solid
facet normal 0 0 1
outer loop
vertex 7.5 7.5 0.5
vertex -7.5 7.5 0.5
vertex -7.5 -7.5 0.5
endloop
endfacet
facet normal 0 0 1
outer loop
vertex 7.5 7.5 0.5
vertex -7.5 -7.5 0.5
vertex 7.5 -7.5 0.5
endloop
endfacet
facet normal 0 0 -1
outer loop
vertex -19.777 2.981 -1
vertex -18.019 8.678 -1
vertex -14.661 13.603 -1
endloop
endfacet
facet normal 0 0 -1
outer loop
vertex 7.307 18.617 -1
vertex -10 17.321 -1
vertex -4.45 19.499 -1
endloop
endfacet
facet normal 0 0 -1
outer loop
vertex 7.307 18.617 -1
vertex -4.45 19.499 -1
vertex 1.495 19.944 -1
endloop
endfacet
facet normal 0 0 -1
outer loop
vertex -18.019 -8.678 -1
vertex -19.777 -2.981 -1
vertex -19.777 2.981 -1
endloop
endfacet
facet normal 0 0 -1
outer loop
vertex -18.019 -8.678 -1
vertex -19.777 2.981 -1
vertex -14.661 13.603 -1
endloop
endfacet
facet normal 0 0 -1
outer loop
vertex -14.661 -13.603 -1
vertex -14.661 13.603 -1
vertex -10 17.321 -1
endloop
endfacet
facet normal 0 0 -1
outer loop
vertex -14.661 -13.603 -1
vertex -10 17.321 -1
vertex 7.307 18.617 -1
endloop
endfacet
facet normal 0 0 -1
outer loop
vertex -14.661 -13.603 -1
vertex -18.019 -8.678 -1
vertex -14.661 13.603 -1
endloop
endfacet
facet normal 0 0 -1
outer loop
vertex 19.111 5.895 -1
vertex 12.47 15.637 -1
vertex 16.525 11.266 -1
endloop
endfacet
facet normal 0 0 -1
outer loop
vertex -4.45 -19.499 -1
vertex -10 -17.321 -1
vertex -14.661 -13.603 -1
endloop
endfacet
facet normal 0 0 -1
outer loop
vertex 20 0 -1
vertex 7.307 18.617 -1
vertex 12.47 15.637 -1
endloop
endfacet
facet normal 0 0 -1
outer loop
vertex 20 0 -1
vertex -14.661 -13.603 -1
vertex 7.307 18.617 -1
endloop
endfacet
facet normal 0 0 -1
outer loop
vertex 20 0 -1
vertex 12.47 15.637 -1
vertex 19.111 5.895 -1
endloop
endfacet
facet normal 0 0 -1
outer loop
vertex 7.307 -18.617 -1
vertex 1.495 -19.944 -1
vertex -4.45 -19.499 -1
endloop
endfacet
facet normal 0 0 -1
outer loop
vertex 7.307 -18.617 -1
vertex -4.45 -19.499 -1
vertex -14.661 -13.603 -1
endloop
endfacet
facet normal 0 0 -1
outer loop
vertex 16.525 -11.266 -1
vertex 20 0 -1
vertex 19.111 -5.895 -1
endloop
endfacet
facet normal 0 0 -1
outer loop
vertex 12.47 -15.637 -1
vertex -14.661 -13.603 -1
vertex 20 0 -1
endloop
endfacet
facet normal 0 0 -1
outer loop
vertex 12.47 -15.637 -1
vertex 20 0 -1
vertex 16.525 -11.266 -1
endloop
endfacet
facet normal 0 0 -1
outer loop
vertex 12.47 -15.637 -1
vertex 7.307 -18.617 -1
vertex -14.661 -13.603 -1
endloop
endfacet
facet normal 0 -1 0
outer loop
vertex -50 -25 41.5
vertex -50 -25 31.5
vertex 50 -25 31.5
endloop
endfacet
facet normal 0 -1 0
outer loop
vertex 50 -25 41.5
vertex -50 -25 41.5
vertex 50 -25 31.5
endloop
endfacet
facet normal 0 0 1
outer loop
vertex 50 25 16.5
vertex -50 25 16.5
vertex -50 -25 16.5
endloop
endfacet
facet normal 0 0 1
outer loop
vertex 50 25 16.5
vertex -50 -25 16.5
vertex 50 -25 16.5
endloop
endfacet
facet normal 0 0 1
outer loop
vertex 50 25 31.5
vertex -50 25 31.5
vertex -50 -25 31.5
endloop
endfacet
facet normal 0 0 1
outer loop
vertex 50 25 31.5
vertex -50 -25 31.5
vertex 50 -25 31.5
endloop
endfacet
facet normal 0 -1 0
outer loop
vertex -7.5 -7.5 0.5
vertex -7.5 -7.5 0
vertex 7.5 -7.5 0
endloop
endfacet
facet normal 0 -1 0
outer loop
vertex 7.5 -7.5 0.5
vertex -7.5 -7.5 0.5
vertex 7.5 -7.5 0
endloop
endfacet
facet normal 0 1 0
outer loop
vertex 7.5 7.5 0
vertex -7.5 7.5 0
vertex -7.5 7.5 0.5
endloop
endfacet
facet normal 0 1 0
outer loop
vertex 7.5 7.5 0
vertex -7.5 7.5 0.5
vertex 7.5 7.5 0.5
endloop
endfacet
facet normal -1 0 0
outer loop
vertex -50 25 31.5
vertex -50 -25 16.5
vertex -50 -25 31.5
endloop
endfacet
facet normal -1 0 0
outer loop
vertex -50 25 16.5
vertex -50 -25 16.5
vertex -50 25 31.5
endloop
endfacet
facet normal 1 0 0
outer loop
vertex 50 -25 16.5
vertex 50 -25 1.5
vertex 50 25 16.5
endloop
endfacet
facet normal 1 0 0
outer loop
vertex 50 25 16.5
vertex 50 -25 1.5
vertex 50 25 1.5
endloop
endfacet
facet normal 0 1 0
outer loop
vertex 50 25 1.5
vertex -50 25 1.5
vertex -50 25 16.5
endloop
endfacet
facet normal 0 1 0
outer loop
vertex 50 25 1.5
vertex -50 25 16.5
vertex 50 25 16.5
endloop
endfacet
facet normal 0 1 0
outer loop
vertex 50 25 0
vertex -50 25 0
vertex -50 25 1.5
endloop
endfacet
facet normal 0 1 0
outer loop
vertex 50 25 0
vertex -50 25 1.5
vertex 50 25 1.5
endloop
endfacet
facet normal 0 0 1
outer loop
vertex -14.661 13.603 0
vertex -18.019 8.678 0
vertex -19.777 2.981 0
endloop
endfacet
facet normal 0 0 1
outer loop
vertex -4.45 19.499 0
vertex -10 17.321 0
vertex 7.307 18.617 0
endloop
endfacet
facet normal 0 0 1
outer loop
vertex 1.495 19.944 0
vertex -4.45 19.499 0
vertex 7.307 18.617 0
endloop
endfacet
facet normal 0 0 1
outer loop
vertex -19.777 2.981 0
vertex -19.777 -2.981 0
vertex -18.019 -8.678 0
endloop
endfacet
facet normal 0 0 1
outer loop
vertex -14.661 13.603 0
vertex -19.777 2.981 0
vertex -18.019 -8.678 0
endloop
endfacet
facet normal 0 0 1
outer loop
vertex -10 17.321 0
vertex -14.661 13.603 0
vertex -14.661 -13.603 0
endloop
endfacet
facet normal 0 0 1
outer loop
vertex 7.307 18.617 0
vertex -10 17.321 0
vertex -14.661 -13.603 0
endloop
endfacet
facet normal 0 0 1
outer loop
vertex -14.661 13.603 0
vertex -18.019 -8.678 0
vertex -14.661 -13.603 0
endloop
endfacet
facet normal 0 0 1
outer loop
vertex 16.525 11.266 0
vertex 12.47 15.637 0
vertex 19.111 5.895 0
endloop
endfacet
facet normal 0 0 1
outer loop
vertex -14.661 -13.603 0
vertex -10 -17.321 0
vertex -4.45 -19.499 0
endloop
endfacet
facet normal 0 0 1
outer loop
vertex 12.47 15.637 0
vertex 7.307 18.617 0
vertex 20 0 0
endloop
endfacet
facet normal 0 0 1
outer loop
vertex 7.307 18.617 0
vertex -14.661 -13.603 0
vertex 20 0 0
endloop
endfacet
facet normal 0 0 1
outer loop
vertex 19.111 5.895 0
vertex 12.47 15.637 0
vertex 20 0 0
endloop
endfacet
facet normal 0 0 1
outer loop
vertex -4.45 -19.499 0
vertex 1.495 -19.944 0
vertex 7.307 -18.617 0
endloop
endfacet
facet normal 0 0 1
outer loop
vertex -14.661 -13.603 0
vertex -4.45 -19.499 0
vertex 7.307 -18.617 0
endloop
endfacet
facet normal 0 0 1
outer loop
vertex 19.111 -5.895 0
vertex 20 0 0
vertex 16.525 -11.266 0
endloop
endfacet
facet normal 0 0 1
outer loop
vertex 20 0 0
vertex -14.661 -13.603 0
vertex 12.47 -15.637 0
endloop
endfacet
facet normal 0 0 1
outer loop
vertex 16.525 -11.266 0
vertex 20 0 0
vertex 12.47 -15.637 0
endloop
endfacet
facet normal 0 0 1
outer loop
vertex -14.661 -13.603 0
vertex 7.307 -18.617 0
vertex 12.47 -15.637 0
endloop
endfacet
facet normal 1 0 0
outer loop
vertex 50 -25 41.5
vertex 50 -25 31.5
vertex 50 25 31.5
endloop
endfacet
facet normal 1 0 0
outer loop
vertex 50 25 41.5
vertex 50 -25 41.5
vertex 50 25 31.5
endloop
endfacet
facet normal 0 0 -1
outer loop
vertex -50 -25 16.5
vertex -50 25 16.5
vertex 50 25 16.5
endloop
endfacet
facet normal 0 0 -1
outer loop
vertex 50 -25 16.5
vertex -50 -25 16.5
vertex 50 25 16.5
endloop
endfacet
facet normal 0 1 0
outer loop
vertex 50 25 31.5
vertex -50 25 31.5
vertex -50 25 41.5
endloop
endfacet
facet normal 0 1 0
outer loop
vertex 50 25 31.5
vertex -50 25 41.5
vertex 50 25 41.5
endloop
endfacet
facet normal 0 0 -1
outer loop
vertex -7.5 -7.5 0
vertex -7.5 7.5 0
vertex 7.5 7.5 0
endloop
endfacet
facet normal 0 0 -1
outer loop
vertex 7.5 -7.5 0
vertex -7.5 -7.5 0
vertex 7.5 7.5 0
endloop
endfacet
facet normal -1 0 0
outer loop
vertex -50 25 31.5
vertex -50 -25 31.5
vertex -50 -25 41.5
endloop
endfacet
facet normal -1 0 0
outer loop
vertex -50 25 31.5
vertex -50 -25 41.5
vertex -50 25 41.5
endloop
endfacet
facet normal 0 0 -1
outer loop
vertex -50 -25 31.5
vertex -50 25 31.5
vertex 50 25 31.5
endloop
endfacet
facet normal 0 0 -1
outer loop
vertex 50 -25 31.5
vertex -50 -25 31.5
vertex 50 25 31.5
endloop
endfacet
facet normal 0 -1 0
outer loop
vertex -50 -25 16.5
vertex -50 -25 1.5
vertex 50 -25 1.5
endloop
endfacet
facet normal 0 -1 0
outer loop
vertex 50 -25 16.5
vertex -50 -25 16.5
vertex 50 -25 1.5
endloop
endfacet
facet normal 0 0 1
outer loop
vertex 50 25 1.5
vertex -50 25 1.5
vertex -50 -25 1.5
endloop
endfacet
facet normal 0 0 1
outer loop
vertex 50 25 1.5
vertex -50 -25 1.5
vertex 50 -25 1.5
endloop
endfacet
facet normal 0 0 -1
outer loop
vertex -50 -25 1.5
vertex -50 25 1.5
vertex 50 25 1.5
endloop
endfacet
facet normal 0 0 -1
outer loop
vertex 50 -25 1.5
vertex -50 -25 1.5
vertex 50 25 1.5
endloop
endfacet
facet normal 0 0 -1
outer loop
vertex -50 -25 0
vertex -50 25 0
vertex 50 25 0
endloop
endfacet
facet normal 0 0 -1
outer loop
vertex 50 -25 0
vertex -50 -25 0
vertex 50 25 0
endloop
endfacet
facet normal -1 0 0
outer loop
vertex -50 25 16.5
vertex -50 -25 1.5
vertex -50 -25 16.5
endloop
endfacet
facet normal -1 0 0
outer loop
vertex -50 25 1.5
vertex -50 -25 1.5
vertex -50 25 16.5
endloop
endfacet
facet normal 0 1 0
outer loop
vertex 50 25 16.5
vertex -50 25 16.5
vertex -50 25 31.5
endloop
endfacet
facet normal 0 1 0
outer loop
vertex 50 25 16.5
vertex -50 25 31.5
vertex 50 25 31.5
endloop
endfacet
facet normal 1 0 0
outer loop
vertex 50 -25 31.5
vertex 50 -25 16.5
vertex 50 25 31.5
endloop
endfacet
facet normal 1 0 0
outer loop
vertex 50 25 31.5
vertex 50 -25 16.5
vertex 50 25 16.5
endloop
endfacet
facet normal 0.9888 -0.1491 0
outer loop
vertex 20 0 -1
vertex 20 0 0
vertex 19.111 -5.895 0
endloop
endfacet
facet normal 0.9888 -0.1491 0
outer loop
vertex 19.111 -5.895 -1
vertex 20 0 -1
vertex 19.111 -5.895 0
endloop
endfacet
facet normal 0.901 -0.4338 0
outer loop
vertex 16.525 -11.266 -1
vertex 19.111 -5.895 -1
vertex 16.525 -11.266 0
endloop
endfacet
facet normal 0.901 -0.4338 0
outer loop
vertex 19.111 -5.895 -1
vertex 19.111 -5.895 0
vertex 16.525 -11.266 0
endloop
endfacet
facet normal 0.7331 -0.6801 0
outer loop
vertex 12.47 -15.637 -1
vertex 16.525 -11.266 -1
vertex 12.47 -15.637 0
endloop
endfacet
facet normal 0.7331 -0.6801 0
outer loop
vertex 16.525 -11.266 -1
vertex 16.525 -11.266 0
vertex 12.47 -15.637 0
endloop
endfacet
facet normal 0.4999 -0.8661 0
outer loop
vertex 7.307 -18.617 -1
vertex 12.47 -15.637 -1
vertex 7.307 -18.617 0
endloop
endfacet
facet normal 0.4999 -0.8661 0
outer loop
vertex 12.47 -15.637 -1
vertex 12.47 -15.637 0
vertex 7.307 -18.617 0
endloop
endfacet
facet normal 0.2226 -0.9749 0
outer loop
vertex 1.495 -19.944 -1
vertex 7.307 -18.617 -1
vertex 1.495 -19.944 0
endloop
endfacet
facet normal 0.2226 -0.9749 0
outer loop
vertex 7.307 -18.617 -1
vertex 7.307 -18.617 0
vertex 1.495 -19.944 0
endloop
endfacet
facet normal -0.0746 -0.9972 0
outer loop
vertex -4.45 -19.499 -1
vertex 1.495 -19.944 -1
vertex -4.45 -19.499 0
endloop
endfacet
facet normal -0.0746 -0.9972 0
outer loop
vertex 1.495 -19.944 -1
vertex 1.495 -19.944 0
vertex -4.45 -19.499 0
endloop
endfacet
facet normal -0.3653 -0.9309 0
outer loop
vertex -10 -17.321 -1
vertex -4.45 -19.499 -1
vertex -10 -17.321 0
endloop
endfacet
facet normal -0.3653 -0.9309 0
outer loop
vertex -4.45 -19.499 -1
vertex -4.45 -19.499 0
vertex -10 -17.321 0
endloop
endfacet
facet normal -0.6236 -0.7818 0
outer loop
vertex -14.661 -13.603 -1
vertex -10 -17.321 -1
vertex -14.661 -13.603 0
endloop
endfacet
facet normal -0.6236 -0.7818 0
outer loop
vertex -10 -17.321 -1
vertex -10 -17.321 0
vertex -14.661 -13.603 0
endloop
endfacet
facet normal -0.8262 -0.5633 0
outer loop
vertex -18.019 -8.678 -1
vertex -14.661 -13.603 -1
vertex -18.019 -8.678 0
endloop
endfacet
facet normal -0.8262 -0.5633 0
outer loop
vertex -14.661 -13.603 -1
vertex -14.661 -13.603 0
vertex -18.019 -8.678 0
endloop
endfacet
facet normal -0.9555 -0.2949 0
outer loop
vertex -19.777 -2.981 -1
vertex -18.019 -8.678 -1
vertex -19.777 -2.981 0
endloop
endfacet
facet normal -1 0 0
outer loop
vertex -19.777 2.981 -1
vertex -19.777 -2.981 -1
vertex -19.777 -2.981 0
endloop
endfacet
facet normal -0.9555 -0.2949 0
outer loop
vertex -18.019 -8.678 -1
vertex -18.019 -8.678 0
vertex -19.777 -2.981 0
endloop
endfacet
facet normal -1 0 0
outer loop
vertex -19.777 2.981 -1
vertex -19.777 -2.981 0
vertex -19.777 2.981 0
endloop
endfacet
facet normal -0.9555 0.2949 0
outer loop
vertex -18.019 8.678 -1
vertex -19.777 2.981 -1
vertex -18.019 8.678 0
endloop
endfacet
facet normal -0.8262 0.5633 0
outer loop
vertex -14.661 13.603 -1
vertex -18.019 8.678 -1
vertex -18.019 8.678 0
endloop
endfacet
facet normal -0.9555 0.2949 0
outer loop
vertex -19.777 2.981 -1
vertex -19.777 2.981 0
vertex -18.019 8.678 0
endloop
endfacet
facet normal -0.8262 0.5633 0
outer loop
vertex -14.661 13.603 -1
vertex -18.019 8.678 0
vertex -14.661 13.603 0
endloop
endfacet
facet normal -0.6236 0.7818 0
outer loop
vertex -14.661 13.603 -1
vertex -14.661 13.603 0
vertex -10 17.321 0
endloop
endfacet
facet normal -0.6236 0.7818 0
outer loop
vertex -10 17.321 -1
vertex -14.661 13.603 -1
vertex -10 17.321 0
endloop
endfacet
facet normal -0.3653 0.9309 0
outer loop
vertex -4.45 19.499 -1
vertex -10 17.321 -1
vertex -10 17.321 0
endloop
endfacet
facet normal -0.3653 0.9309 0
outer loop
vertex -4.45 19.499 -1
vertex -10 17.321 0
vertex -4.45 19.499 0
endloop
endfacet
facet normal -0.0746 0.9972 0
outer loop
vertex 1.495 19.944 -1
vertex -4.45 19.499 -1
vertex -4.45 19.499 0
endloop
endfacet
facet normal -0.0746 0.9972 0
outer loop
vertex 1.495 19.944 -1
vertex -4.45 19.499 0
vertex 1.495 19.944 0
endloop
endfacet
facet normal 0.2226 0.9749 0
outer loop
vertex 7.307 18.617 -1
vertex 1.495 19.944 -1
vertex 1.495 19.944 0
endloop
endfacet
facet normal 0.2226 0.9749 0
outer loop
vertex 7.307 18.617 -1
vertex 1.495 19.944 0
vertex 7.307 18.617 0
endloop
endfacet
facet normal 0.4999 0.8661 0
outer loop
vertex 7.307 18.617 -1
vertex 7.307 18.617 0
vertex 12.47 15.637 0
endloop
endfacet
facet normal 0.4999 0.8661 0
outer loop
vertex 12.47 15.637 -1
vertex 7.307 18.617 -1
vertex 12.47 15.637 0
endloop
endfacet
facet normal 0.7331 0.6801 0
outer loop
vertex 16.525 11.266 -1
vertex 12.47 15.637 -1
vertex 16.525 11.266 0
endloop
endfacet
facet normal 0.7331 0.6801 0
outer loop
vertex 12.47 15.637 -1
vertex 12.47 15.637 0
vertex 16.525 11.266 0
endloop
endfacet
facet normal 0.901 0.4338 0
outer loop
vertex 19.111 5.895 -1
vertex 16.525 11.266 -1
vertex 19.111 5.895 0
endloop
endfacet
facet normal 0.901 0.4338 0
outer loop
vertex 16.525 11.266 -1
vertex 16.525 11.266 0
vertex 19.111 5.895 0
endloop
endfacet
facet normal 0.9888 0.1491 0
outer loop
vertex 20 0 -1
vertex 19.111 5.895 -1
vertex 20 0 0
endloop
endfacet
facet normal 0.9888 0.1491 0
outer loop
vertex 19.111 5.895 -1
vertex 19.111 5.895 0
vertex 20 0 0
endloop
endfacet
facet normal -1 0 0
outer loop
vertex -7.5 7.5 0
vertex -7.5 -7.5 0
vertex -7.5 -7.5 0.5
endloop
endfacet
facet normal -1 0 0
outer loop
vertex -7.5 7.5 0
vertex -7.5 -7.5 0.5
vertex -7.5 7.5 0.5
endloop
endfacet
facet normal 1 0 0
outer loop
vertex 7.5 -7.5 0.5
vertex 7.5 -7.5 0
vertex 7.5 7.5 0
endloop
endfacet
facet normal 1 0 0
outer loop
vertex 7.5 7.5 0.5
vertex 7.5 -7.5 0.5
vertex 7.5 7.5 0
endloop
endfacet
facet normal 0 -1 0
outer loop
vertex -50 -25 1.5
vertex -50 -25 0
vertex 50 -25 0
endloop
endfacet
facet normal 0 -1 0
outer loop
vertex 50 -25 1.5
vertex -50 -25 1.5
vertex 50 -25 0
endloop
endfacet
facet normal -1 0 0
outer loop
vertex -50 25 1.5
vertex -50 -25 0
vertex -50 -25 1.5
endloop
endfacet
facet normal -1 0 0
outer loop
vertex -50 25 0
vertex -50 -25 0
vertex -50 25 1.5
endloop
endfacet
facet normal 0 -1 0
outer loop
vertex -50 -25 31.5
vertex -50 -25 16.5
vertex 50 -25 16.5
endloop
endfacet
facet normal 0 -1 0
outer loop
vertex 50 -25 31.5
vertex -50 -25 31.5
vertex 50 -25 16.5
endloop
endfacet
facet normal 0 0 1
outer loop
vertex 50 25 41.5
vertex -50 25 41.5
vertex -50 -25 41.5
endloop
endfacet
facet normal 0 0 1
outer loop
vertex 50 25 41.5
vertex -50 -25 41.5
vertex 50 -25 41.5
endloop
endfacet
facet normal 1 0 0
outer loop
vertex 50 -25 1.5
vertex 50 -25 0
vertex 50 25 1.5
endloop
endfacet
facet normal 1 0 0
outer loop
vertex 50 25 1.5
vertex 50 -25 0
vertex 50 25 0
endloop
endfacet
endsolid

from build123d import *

# Parameters (mm, degrees)
F0_W      = 15
F0_H      = 15
F1_DEPTH  = 0.5
F2_W      = 100
F2_H      = 50
F3_DEPTH  = 1.5
F4_W      = 100
F4_H      = 50
F5_DEPTH  = 15
F6_W      = 100
F6_H      = 50
F7_DEPTH  = 15
F8_W      = 100
F8_H      = 50
F9_DEPTH  = 10
F10_R     = 20
F11_DEPTH = 1


with BuildPart() as f1:
    # F0 (on Top) → F1 (new body)
    with BuildSketch(Plane.XY):
        Rectangle(F0_W, F0_H)
    extrude(amount=F1_DEPTH)


with BuildPart() as f3:
    # F2 (on Top) → F3 (new body)
    with BuildSketch(Plane.XY):
        Rectangle(F2_W, F2_H)
    extrude(amount=F3_DEPTH)


with BuildPart() as f5:
    # F4 (on face) → F5 (new body)
    with BuildSketch(Plane.XY.offset(1.5)):
        Rectangle(F4_W, F4_H)
    extrude(amount=F5_DEPTH)


with BuildPart() as f7:
    # F6 (on face) → F7 (new body)
    with BuildSketch(Plane.XY.offset(16.5)):
        Rectangle(F6_W, F6_H)
    extrude(amount=F7_DEPTH)


with BuildPart() as f9:
    # F8 (on face) → F9 (new body)
    with BuildSketch(Plane.XY.offset(31.5)):
        Rectangle(F8_W, F8_H)
    extrude(amount=F9_DEPTH)


with BuildPart() as f11:
    # F10 (on face) → F11 (new body)
    with BuildSketch(Plane(origin=(0, 0, 0), x_dir=(1, 0, 0), z_dir=(0, 0, -1))):
        Circle(F10_R)
    extrude(amount=F11_DEPTH)


solid = Compound([f1.part, f3.part, f5.part, f7.part, f9.part, f11.part])
